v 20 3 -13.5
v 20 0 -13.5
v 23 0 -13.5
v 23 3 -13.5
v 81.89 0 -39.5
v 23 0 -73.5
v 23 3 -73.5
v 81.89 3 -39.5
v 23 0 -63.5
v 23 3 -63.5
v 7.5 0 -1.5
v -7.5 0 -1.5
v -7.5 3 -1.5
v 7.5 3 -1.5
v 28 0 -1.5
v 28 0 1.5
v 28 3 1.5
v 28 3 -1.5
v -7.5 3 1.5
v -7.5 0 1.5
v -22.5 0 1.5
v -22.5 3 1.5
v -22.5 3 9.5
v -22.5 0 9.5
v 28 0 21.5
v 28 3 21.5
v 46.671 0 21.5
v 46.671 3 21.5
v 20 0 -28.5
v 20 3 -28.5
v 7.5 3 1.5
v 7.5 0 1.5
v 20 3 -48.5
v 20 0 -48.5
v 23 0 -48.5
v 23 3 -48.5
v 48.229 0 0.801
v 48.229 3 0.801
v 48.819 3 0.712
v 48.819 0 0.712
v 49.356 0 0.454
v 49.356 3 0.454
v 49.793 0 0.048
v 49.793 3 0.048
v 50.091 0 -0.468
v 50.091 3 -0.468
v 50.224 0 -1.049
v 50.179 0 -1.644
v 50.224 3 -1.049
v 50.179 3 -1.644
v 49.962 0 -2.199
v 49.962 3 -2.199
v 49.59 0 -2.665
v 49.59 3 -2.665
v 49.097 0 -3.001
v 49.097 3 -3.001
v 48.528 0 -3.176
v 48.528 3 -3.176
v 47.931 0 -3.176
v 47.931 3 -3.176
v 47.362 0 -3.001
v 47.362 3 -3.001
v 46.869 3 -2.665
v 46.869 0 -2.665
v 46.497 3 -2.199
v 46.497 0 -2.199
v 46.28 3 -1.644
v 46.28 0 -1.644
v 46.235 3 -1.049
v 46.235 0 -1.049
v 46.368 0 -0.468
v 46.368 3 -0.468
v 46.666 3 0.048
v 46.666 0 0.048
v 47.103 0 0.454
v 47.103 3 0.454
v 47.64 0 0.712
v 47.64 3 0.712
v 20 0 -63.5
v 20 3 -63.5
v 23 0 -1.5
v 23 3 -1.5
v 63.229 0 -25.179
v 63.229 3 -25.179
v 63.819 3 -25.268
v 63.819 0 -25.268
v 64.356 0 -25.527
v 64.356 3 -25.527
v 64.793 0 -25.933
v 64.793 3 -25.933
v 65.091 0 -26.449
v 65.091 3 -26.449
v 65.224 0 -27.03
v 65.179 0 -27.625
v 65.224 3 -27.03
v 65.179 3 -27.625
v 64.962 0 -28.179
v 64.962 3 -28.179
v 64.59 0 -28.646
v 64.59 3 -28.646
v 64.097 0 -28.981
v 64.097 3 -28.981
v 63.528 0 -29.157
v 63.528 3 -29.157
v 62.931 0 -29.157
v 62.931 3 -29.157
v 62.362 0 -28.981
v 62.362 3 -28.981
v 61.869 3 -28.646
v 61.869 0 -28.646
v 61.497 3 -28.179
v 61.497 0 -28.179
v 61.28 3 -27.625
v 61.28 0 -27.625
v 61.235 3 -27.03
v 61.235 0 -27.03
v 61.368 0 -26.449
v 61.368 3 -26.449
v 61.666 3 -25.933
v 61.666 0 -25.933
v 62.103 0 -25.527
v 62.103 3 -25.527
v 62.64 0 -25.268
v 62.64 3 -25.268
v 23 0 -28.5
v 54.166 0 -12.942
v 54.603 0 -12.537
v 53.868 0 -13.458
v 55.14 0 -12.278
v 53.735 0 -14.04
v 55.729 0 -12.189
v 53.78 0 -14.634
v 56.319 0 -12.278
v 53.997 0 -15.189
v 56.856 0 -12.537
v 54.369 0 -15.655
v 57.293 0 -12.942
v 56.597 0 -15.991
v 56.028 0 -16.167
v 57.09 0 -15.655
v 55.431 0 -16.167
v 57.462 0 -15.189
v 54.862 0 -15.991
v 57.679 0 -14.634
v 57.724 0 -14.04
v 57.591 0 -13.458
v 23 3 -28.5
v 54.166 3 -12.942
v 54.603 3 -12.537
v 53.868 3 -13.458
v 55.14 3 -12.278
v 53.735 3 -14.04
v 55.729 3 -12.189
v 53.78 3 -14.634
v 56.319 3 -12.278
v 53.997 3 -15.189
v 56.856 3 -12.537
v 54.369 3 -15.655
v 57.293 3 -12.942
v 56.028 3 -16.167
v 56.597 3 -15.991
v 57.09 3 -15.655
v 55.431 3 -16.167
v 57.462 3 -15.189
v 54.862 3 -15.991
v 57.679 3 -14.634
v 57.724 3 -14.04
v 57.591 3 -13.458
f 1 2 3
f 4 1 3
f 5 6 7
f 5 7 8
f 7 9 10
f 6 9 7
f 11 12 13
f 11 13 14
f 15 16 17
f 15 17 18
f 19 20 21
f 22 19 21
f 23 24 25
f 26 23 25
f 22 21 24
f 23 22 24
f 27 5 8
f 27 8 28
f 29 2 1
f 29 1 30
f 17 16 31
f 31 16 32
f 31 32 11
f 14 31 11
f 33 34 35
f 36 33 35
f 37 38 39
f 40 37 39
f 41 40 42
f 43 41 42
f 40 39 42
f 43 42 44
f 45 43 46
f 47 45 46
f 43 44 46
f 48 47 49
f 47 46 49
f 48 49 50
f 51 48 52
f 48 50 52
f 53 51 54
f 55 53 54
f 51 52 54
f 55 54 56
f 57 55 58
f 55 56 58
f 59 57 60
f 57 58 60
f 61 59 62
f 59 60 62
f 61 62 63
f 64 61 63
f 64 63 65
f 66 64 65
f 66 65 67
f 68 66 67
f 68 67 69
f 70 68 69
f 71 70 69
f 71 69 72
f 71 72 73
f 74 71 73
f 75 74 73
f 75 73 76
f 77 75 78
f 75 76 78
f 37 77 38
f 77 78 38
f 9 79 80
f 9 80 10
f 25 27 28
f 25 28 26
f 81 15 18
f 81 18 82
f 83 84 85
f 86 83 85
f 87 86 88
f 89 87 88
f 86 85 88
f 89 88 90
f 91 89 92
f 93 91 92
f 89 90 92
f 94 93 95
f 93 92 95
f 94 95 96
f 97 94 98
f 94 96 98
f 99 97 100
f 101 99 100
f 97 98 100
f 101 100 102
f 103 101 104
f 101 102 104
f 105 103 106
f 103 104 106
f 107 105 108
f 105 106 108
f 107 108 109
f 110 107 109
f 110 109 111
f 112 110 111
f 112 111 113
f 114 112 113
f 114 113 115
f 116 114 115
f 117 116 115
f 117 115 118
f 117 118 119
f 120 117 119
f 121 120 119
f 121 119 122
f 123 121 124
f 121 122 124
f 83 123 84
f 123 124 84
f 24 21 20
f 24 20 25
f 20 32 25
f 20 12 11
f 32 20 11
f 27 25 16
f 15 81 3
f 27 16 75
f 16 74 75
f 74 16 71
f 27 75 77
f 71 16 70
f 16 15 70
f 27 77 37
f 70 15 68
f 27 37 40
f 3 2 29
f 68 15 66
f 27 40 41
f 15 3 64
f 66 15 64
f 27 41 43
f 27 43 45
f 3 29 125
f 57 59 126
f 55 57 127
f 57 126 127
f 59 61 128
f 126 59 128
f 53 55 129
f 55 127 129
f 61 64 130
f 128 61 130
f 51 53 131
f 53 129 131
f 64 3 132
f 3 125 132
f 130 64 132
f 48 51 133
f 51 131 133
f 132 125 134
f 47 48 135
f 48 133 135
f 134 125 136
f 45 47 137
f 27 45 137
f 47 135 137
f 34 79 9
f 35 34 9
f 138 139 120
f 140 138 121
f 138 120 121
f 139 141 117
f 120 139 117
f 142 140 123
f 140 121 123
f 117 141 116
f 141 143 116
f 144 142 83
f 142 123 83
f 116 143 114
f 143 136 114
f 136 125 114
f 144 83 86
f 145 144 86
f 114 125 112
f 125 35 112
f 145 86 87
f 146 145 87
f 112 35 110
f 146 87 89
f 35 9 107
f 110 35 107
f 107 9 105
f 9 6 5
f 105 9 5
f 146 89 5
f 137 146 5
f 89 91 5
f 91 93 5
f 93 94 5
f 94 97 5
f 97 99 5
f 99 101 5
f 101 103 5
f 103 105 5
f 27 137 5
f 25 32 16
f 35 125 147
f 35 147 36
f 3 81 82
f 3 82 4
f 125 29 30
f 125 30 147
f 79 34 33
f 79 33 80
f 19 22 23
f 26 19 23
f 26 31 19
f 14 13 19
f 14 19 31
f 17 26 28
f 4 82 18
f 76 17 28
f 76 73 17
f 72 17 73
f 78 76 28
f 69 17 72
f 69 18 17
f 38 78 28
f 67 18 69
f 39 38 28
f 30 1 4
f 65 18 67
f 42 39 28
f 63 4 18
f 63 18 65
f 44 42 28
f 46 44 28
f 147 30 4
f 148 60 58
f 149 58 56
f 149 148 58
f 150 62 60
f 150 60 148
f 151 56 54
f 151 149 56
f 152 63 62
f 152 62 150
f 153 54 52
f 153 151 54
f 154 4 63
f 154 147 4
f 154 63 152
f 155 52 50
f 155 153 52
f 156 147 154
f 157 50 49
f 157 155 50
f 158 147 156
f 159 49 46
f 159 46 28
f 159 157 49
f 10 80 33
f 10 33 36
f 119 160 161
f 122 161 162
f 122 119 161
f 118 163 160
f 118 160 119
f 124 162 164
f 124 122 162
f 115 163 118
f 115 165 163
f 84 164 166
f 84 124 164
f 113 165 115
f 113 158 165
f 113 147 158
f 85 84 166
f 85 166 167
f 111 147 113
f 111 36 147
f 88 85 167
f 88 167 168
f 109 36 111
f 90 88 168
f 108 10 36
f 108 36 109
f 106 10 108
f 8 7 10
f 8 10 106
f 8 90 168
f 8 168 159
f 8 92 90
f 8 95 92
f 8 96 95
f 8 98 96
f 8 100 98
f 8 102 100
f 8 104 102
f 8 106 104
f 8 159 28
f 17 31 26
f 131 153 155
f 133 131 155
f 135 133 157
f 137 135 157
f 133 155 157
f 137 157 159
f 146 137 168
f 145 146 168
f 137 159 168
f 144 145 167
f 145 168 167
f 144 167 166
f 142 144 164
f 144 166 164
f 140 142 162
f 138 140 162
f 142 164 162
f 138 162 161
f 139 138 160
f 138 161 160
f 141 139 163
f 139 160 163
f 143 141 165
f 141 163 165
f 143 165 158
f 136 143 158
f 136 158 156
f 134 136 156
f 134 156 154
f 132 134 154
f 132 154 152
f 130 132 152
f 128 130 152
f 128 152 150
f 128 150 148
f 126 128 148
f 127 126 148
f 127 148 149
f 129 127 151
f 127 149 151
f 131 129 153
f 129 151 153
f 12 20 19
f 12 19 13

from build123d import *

# Parameters (mm, degrees)
SKETCH_1_W          = 15
SKETCH_1_H          = 3
SKETCH_1_W_2        = 3
SKETCH_1_H_2        = 15
EXTRUDE_1_DEPTH     = 3
SKETCH_2_R          = 2
CUT_EXTRUDE_1_DEPTH = 3


with BuildPart() as part:
    # 草图1 → 凸台-拉伸1 (new body)
    with BuildSketch(Plane(origin=(0, 0, 0), x_dir=(1, 0, 0), z_dir=(0, 1, 0))):
        Polygon((28, -21.5), (28, -1.5), (7.5, -1.5), (-7.5, -1.5), (-22.5, -1.5), align=None)
        Rectangle(SKETCH_1_W, SKETCH_1_H)
        with Locations((21.5, 21)):
            Rectangle(SKETCH_1_W_2, SKETCH_1_H_2)
        with Locations((21.5, 56)):
            Rectangle(SKETCH_1_W_2, SKETCH_1_H_2)
        Polygon((46.671361037, -21.5), (28, -21.5), (28, -1.5), (28, 1.5), (23, 1.5), (23, 13.5), (23, 28.5), (23, 48.5), (23, 63.5), (23, 73.5), (81.889727457, 39.5), align=None)
        Polygon((-22.5, -1.5), (-22.5, -9.5), (28, -21.5), align=None)
    extrude(amount=EXTRUDE_1_DEPTH)

    # 草图2 → 切除-拉伸1 (cut)
    with BuildSketch(Plane(origin=(0, 3, 0), x_dir=(1, 0, 0), z_dir=(0, 1, 0))):
        with Locations(Location((63.229473419, 27.179491924, 0), (0, 0, 270))):
            Circle(SKETCH_2_R)
        with Locations(Location((55.729473419, 14.189110868, 0), (0, 0, 270))):
            Circle(SKETCH_2_R)
        with Locations(Location((48.229473419, 1.198729811, 0), (0, 0, 270))):
            Circle(SKETCH_2_R)
    extrude(amount=-CUT_EXTRUDE_1_DEPTH, mode=Mode.SUBTRACT)


solid = part.part
